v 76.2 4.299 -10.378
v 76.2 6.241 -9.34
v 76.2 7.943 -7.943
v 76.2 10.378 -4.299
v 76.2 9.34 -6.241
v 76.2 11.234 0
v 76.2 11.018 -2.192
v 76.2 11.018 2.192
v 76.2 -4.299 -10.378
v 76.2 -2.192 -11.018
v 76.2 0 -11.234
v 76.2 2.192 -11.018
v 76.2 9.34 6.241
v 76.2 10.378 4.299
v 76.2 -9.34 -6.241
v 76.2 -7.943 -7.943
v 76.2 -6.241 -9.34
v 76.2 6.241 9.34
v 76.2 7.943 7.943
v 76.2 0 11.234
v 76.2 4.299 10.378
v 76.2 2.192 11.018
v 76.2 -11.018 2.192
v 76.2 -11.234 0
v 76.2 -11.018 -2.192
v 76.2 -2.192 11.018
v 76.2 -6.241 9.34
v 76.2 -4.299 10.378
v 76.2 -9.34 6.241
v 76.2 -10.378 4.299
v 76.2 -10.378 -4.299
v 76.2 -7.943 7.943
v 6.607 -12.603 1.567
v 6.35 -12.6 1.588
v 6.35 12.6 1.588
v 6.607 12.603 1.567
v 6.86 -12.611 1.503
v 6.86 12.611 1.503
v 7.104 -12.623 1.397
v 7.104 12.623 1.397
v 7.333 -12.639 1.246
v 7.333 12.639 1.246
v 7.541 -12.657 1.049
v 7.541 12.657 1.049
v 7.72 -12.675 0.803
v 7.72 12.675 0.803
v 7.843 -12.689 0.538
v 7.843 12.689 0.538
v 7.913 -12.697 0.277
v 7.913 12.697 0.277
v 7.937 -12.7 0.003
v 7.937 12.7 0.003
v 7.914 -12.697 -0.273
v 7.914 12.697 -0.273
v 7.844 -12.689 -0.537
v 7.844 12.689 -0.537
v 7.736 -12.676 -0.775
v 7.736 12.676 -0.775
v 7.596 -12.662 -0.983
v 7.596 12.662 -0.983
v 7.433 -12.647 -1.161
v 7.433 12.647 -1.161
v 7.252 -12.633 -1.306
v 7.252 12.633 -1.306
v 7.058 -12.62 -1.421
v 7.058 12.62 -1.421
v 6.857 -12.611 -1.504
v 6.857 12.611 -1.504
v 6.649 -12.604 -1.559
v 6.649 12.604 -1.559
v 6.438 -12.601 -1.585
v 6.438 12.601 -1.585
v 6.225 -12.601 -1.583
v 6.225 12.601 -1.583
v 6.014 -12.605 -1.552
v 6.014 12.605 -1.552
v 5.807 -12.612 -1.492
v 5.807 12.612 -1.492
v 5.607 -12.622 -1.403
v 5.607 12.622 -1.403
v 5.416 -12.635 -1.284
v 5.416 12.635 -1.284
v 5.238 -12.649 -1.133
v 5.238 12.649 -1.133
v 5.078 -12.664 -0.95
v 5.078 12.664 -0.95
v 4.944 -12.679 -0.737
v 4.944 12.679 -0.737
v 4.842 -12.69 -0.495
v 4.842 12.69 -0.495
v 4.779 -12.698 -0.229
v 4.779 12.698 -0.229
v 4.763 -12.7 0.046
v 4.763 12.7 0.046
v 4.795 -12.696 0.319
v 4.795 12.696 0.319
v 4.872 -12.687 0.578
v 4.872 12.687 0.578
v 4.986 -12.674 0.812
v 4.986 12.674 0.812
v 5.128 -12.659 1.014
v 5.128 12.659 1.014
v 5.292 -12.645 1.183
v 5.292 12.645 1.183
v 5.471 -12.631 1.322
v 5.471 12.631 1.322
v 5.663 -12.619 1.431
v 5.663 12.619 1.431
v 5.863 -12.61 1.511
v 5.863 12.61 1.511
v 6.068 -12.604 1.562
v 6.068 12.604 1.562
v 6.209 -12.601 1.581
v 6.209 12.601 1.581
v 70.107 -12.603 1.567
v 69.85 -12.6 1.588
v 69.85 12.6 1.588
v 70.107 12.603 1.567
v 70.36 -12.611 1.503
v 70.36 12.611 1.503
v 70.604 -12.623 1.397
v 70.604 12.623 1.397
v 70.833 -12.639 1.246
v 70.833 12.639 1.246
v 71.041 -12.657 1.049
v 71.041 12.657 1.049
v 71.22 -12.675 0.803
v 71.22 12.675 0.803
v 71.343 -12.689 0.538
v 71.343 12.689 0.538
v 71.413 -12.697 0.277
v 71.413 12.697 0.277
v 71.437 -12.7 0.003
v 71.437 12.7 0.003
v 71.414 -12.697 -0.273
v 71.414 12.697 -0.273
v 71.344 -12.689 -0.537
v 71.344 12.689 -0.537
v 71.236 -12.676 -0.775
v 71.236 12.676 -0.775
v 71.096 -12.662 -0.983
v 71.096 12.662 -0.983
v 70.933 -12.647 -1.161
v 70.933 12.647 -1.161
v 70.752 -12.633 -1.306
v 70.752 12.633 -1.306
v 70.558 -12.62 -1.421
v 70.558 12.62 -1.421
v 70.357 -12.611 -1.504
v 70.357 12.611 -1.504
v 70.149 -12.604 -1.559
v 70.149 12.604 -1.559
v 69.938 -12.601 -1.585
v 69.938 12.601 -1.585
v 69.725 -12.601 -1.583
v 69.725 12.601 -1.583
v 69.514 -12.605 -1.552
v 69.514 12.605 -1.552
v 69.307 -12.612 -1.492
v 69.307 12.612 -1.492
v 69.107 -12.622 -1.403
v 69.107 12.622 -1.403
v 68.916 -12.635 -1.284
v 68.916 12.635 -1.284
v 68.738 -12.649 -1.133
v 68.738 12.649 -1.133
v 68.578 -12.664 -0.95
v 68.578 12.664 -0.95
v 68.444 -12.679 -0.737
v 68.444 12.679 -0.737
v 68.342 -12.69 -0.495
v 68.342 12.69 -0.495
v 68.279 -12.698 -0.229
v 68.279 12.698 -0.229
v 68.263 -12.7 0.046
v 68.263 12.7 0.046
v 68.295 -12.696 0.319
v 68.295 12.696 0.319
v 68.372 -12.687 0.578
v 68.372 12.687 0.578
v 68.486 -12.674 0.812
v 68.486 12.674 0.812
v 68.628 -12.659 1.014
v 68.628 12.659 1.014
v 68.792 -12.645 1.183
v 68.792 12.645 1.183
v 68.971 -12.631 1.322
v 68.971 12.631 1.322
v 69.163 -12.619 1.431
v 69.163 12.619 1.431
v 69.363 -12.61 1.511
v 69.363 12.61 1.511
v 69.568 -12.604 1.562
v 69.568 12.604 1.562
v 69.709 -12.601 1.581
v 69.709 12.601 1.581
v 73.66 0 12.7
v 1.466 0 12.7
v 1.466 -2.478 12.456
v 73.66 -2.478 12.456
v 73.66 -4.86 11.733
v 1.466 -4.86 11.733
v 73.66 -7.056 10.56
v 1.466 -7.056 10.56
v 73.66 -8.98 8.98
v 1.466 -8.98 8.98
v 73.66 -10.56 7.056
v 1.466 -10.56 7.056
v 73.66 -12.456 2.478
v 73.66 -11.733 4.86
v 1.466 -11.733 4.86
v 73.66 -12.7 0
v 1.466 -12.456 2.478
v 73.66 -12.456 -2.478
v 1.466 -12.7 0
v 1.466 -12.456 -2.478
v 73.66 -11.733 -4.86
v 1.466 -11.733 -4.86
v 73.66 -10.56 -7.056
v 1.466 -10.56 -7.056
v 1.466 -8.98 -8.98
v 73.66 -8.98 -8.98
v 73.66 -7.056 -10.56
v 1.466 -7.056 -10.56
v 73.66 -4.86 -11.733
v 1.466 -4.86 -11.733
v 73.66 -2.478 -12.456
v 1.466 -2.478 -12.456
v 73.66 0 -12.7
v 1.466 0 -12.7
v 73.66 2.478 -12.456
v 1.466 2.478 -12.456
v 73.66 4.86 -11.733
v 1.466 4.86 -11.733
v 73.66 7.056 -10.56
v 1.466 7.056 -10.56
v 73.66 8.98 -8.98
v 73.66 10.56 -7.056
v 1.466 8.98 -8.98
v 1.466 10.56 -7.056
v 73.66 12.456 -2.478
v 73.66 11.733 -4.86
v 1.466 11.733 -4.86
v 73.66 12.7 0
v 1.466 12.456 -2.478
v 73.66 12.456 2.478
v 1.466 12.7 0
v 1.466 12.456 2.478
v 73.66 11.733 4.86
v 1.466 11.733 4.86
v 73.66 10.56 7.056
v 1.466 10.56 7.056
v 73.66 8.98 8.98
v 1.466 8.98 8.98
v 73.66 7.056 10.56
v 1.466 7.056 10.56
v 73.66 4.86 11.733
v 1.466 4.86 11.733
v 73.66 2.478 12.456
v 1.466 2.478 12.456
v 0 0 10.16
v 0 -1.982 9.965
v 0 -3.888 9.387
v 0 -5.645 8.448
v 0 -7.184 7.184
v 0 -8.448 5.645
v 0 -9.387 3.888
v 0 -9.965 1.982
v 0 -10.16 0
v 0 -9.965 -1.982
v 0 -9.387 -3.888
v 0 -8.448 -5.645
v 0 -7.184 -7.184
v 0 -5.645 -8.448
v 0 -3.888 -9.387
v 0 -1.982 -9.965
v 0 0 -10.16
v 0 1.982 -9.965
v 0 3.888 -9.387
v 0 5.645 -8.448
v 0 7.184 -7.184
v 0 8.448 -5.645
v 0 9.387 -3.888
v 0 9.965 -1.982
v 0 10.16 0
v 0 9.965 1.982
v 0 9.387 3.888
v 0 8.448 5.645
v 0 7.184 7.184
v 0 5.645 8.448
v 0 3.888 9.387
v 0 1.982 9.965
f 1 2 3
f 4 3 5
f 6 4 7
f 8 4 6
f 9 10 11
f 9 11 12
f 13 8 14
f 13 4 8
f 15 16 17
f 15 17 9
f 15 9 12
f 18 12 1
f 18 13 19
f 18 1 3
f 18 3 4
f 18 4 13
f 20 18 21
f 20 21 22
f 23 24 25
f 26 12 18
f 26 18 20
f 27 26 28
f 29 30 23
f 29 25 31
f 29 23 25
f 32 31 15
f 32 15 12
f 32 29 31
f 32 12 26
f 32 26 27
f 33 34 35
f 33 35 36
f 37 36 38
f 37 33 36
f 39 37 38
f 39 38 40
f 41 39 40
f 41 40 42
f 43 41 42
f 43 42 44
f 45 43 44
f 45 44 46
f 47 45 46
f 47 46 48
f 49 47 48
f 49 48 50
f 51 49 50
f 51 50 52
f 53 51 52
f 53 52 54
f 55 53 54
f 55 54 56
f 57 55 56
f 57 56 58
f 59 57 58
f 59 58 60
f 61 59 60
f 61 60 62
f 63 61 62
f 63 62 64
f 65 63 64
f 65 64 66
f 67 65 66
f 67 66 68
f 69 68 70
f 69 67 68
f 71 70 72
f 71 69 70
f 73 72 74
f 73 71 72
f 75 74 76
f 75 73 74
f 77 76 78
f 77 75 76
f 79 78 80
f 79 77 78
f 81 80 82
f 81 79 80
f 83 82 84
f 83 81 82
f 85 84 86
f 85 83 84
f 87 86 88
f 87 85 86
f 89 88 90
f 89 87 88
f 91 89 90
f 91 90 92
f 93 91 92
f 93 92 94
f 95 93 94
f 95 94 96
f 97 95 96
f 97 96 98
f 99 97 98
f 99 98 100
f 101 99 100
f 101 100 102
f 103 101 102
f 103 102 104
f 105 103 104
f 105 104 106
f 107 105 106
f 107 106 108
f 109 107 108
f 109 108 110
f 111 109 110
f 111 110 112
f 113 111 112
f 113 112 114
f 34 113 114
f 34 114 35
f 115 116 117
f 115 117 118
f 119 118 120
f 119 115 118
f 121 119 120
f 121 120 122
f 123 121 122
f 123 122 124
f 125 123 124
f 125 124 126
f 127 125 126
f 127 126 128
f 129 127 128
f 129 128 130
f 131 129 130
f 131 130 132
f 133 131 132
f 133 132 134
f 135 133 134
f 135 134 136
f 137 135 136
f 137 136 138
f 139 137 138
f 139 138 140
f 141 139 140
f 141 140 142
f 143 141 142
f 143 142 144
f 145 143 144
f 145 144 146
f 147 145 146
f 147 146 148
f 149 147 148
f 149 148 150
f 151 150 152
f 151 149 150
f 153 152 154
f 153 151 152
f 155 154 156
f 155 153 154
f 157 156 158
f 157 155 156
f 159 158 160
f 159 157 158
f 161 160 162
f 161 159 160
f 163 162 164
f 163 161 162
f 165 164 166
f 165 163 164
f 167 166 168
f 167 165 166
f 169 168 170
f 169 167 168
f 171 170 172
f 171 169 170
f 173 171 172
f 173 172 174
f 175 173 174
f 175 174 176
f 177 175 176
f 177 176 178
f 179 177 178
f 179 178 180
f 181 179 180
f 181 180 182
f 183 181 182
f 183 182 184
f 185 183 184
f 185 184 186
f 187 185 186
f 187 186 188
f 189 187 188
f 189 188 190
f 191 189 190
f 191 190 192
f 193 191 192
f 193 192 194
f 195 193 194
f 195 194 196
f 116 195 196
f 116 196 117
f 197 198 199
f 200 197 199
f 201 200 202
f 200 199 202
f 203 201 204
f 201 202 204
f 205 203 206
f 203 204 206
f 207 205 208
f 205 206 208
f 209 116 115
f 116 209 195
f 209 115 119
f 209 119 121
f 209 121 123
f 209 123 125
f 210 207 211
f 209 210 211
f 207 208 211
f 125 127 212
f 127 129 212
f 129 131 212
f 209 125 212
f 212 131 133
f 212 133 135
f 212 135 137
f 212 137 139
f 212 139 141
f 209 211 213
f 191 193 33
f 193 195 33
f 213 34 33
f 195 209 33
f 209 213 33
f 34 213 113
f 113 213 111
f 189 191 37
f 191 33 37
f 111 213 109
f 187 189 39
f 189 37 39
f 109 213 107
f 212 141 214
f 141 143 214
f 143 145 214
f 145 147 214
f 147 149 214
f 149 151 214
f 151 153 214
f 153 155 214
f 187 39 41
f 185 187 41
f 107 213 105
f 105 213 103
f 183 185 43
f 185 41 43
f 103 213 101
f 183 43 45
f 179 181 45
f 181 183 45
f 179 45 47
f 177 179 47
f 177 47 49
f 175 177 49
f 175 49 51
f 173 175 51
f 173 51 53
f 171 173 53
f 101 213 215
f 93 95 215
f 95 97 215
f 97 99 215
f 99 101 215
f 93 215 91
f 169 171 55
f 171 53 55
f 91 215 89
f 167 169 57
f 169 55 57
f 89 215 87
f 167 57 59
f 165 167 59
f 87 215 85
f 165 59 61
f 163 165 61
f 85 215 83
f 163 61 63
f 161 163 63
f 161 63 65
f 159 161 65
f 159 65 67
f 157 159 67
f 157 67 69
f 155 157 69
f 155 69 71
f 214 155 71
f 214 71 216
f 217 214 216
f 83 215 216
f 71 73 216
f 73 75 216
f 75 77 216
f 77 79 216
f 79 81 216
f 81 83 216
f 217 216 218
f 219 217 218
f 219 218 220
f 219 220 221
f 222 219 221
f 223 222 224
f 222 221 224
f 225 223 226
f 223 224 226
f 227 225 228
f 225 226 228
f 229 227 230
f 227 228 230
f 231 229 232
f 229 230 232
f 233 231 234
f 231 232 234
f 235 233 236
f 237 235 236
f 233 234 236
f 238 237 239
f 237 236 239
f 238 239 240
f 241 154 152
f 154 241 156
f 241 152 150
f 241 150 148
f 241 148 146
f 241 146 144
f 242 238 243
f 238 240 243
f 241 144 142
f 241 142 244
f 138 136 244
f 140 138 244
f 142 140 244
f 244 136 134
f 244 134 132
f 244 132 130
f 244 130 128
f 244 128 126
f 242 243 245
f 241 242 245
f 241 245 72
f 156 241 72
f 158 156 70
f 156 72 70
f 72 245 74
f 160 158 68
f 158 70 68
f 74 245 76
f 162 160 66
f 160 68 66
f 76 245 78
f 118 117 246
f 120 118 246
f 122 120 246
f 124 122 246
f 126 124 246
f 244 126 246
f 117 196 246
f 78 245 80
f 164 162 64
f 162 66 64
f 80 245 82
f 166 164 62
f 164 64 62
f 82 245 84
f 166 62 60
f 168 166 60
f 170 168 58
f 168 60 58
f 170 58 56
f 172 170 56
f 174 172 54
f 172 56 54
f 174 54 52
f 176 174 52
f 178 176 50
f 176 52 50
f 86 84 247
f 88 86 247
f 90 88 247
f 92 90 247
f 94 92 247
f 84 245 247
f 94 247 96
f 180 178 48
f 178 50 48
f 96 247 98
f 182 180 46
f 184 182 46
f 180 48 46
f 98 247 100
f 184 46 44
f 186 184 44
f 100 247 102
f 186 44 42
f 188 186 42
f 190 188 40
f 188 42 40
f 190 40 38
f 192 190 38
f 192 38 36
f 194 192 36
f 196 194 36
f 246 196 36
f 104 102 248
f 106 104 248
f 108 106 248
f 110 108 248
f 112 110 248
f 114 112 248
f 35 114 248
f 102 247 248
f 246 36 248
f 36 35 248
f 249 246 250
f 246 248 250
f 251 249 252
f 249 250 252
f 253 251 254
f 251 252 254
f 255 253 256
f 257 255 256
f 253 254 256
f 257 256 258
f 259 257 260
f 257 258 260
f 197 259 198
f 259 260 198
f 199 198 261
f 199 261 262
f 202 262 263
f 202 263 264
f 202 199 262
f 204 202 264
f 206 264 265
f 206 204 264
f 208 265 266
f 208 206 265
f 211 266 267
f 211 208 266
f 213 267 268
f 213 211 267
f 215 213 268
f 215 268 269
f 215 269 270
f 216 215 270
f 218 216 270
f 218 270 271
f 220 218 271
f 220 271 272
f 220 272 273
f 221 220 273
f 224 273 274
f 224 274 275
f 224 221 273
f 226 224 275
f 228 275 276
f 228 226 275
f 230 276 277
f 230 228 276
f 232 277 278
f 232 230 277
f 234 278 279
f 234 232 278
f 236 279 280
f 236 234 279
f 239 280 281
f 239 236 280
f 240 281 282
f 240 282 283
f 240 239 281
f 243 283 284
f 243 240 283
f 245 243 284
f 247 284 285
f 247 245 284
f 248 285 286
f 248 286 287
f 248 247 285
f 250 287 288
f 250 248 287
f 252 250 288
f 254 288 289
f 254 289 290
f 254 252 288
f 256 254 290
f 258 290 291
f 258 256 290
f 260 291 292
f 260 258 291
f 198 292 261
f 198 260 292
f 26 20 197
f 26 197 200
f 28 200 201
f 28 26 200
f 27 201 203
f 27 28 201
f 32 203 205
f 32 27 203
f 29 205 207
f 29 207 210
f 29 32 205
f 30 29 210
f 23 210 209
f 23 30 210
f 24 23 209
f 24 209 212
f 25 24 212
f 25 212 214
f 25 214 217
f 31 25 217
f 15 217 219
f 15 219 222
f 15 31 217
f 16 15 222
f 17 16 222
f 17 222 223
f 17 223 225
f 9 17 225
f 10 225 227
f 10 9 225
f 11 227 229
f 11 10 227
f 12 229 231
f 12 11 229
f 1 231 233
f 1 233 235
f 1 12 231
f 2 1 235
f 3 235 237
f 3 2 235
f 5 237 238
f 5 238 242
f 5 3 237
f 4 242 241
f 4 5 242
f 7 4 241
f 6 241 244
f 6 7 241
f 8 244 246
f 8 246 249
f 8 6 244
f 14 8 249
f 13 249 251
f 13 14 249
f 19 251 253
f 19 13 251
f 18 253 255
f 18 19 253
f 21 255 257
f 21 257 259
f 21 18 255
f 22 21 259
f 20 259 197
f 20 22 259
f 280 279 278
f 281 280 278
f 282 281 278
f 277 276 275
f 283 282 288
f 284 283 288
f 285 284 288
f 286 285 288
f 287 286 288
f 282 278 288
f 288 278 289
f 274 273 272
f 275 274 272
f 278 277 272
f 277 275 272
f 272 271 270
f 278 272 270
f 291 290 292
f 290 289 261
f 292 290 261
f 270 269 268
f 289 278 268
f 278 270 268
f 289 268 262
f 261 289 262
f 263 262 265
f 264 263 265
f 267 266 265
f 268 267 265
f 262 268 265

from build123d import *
from OCP.BRepFilletAPI import BRepFilletAPI_MakeChamfer

# Parameters (mm, degrees)
SKETCH2_R               = 12.7
BOSS_EXTRUDE1_DEPTH     = 76.2
CHAMFER1_SIZE           = 2.54
CHAMFER1_SIZE2          = 1.466469684
CUT_EXTRUDE1_DEPTH      = 79.288057838
CUT_EXTRUDE1_DEPTH_BACK = 79.288057838
SKETCH6_R               = 1.5875


with BuildPart() as part:
    # Sketch2 → Boss-Extrude1 (new body)
    with BuildSketch(Plane(origin=(0, 0, 0), x_dir=(0, 0, -1), z_dir=(1, 0, 0))):
        with Locations(Location((0, 0, 0), (0, 0, 180))):
            Circle(SKETCH2_R)
    extrude(amount=BOSS_EXTRUDE1_DEPTH)

    # Chamfer1: one chamfer whose edges measure the first distance from different faces: ONE call of the kernel's chamfer builder (chamfer() names one face for all edges)
    chamfer1_edges_1 = [part.edges().sort_by_distance(p)[0] for p in [
        (0, 0, -12.7),
    ]]
    chamfer1_side_1 = [part.faces().sort_by_distance(p)[0] for p in [
        (0, 0, 0),
    ]]
    chamfer1_edges_2 = [part.edges().sort_by_distance(p)[0] for p in [
        (76.2, 0, -12.7),
    ]]
    chamfer1_side_2 = [part.faces().sort_by_distance(p)[0] for p in [
        (38.1, 0, -12.7),
    ]]
    chamfer1 = BRepFilletAPI_MakeChamfer(part.part.solid().wrapped)
    for e in chamfer1_edges_1:
        chamfer1.Add(CHAMFER1_SIZE, CHAMFER1_SIZE2, e.wrapped, chamfer1_side_1[0].wrapped)  # the first distance lies on this face
    for e in chamfer1_edges_2:
        chamfer1.Add(CHAMFER1_SIZE, CHAMFER1_SIZE2, e.wrapped, chamfer1_side_2[0].wrapped)  # the first distance lies on this face
    add(Compound.cast(chamfer1.Shape()), mode=Mode.REPLACE)

    # Sketch6 → Cut-Extrude1 (cut, two sides: drawn at the far end of the back side and taken through both)
    with BuildSketch(Plane(origin=(0, 0, 0), x_dir=(1, 0, 0), z_dir=(0, 1, 0)).offset(-CUT_EXTRUDE1_DEPTH_BACK)):
        with Locations(Location((6.35, 0, 0), (0, 0, 270))):
            Circle(SKETCH6_R)
        with Locations(Location((69.85, 0, 0), (0, 0, 270))):
            Circle(SKETCH6_R)
    extrude(amount=CUT_EXTRUDE1_DEPTH + CUT_EXTRUDE1_DEPTH_BACK, mode=Mode.SUBTRACT)


solid = part.part
